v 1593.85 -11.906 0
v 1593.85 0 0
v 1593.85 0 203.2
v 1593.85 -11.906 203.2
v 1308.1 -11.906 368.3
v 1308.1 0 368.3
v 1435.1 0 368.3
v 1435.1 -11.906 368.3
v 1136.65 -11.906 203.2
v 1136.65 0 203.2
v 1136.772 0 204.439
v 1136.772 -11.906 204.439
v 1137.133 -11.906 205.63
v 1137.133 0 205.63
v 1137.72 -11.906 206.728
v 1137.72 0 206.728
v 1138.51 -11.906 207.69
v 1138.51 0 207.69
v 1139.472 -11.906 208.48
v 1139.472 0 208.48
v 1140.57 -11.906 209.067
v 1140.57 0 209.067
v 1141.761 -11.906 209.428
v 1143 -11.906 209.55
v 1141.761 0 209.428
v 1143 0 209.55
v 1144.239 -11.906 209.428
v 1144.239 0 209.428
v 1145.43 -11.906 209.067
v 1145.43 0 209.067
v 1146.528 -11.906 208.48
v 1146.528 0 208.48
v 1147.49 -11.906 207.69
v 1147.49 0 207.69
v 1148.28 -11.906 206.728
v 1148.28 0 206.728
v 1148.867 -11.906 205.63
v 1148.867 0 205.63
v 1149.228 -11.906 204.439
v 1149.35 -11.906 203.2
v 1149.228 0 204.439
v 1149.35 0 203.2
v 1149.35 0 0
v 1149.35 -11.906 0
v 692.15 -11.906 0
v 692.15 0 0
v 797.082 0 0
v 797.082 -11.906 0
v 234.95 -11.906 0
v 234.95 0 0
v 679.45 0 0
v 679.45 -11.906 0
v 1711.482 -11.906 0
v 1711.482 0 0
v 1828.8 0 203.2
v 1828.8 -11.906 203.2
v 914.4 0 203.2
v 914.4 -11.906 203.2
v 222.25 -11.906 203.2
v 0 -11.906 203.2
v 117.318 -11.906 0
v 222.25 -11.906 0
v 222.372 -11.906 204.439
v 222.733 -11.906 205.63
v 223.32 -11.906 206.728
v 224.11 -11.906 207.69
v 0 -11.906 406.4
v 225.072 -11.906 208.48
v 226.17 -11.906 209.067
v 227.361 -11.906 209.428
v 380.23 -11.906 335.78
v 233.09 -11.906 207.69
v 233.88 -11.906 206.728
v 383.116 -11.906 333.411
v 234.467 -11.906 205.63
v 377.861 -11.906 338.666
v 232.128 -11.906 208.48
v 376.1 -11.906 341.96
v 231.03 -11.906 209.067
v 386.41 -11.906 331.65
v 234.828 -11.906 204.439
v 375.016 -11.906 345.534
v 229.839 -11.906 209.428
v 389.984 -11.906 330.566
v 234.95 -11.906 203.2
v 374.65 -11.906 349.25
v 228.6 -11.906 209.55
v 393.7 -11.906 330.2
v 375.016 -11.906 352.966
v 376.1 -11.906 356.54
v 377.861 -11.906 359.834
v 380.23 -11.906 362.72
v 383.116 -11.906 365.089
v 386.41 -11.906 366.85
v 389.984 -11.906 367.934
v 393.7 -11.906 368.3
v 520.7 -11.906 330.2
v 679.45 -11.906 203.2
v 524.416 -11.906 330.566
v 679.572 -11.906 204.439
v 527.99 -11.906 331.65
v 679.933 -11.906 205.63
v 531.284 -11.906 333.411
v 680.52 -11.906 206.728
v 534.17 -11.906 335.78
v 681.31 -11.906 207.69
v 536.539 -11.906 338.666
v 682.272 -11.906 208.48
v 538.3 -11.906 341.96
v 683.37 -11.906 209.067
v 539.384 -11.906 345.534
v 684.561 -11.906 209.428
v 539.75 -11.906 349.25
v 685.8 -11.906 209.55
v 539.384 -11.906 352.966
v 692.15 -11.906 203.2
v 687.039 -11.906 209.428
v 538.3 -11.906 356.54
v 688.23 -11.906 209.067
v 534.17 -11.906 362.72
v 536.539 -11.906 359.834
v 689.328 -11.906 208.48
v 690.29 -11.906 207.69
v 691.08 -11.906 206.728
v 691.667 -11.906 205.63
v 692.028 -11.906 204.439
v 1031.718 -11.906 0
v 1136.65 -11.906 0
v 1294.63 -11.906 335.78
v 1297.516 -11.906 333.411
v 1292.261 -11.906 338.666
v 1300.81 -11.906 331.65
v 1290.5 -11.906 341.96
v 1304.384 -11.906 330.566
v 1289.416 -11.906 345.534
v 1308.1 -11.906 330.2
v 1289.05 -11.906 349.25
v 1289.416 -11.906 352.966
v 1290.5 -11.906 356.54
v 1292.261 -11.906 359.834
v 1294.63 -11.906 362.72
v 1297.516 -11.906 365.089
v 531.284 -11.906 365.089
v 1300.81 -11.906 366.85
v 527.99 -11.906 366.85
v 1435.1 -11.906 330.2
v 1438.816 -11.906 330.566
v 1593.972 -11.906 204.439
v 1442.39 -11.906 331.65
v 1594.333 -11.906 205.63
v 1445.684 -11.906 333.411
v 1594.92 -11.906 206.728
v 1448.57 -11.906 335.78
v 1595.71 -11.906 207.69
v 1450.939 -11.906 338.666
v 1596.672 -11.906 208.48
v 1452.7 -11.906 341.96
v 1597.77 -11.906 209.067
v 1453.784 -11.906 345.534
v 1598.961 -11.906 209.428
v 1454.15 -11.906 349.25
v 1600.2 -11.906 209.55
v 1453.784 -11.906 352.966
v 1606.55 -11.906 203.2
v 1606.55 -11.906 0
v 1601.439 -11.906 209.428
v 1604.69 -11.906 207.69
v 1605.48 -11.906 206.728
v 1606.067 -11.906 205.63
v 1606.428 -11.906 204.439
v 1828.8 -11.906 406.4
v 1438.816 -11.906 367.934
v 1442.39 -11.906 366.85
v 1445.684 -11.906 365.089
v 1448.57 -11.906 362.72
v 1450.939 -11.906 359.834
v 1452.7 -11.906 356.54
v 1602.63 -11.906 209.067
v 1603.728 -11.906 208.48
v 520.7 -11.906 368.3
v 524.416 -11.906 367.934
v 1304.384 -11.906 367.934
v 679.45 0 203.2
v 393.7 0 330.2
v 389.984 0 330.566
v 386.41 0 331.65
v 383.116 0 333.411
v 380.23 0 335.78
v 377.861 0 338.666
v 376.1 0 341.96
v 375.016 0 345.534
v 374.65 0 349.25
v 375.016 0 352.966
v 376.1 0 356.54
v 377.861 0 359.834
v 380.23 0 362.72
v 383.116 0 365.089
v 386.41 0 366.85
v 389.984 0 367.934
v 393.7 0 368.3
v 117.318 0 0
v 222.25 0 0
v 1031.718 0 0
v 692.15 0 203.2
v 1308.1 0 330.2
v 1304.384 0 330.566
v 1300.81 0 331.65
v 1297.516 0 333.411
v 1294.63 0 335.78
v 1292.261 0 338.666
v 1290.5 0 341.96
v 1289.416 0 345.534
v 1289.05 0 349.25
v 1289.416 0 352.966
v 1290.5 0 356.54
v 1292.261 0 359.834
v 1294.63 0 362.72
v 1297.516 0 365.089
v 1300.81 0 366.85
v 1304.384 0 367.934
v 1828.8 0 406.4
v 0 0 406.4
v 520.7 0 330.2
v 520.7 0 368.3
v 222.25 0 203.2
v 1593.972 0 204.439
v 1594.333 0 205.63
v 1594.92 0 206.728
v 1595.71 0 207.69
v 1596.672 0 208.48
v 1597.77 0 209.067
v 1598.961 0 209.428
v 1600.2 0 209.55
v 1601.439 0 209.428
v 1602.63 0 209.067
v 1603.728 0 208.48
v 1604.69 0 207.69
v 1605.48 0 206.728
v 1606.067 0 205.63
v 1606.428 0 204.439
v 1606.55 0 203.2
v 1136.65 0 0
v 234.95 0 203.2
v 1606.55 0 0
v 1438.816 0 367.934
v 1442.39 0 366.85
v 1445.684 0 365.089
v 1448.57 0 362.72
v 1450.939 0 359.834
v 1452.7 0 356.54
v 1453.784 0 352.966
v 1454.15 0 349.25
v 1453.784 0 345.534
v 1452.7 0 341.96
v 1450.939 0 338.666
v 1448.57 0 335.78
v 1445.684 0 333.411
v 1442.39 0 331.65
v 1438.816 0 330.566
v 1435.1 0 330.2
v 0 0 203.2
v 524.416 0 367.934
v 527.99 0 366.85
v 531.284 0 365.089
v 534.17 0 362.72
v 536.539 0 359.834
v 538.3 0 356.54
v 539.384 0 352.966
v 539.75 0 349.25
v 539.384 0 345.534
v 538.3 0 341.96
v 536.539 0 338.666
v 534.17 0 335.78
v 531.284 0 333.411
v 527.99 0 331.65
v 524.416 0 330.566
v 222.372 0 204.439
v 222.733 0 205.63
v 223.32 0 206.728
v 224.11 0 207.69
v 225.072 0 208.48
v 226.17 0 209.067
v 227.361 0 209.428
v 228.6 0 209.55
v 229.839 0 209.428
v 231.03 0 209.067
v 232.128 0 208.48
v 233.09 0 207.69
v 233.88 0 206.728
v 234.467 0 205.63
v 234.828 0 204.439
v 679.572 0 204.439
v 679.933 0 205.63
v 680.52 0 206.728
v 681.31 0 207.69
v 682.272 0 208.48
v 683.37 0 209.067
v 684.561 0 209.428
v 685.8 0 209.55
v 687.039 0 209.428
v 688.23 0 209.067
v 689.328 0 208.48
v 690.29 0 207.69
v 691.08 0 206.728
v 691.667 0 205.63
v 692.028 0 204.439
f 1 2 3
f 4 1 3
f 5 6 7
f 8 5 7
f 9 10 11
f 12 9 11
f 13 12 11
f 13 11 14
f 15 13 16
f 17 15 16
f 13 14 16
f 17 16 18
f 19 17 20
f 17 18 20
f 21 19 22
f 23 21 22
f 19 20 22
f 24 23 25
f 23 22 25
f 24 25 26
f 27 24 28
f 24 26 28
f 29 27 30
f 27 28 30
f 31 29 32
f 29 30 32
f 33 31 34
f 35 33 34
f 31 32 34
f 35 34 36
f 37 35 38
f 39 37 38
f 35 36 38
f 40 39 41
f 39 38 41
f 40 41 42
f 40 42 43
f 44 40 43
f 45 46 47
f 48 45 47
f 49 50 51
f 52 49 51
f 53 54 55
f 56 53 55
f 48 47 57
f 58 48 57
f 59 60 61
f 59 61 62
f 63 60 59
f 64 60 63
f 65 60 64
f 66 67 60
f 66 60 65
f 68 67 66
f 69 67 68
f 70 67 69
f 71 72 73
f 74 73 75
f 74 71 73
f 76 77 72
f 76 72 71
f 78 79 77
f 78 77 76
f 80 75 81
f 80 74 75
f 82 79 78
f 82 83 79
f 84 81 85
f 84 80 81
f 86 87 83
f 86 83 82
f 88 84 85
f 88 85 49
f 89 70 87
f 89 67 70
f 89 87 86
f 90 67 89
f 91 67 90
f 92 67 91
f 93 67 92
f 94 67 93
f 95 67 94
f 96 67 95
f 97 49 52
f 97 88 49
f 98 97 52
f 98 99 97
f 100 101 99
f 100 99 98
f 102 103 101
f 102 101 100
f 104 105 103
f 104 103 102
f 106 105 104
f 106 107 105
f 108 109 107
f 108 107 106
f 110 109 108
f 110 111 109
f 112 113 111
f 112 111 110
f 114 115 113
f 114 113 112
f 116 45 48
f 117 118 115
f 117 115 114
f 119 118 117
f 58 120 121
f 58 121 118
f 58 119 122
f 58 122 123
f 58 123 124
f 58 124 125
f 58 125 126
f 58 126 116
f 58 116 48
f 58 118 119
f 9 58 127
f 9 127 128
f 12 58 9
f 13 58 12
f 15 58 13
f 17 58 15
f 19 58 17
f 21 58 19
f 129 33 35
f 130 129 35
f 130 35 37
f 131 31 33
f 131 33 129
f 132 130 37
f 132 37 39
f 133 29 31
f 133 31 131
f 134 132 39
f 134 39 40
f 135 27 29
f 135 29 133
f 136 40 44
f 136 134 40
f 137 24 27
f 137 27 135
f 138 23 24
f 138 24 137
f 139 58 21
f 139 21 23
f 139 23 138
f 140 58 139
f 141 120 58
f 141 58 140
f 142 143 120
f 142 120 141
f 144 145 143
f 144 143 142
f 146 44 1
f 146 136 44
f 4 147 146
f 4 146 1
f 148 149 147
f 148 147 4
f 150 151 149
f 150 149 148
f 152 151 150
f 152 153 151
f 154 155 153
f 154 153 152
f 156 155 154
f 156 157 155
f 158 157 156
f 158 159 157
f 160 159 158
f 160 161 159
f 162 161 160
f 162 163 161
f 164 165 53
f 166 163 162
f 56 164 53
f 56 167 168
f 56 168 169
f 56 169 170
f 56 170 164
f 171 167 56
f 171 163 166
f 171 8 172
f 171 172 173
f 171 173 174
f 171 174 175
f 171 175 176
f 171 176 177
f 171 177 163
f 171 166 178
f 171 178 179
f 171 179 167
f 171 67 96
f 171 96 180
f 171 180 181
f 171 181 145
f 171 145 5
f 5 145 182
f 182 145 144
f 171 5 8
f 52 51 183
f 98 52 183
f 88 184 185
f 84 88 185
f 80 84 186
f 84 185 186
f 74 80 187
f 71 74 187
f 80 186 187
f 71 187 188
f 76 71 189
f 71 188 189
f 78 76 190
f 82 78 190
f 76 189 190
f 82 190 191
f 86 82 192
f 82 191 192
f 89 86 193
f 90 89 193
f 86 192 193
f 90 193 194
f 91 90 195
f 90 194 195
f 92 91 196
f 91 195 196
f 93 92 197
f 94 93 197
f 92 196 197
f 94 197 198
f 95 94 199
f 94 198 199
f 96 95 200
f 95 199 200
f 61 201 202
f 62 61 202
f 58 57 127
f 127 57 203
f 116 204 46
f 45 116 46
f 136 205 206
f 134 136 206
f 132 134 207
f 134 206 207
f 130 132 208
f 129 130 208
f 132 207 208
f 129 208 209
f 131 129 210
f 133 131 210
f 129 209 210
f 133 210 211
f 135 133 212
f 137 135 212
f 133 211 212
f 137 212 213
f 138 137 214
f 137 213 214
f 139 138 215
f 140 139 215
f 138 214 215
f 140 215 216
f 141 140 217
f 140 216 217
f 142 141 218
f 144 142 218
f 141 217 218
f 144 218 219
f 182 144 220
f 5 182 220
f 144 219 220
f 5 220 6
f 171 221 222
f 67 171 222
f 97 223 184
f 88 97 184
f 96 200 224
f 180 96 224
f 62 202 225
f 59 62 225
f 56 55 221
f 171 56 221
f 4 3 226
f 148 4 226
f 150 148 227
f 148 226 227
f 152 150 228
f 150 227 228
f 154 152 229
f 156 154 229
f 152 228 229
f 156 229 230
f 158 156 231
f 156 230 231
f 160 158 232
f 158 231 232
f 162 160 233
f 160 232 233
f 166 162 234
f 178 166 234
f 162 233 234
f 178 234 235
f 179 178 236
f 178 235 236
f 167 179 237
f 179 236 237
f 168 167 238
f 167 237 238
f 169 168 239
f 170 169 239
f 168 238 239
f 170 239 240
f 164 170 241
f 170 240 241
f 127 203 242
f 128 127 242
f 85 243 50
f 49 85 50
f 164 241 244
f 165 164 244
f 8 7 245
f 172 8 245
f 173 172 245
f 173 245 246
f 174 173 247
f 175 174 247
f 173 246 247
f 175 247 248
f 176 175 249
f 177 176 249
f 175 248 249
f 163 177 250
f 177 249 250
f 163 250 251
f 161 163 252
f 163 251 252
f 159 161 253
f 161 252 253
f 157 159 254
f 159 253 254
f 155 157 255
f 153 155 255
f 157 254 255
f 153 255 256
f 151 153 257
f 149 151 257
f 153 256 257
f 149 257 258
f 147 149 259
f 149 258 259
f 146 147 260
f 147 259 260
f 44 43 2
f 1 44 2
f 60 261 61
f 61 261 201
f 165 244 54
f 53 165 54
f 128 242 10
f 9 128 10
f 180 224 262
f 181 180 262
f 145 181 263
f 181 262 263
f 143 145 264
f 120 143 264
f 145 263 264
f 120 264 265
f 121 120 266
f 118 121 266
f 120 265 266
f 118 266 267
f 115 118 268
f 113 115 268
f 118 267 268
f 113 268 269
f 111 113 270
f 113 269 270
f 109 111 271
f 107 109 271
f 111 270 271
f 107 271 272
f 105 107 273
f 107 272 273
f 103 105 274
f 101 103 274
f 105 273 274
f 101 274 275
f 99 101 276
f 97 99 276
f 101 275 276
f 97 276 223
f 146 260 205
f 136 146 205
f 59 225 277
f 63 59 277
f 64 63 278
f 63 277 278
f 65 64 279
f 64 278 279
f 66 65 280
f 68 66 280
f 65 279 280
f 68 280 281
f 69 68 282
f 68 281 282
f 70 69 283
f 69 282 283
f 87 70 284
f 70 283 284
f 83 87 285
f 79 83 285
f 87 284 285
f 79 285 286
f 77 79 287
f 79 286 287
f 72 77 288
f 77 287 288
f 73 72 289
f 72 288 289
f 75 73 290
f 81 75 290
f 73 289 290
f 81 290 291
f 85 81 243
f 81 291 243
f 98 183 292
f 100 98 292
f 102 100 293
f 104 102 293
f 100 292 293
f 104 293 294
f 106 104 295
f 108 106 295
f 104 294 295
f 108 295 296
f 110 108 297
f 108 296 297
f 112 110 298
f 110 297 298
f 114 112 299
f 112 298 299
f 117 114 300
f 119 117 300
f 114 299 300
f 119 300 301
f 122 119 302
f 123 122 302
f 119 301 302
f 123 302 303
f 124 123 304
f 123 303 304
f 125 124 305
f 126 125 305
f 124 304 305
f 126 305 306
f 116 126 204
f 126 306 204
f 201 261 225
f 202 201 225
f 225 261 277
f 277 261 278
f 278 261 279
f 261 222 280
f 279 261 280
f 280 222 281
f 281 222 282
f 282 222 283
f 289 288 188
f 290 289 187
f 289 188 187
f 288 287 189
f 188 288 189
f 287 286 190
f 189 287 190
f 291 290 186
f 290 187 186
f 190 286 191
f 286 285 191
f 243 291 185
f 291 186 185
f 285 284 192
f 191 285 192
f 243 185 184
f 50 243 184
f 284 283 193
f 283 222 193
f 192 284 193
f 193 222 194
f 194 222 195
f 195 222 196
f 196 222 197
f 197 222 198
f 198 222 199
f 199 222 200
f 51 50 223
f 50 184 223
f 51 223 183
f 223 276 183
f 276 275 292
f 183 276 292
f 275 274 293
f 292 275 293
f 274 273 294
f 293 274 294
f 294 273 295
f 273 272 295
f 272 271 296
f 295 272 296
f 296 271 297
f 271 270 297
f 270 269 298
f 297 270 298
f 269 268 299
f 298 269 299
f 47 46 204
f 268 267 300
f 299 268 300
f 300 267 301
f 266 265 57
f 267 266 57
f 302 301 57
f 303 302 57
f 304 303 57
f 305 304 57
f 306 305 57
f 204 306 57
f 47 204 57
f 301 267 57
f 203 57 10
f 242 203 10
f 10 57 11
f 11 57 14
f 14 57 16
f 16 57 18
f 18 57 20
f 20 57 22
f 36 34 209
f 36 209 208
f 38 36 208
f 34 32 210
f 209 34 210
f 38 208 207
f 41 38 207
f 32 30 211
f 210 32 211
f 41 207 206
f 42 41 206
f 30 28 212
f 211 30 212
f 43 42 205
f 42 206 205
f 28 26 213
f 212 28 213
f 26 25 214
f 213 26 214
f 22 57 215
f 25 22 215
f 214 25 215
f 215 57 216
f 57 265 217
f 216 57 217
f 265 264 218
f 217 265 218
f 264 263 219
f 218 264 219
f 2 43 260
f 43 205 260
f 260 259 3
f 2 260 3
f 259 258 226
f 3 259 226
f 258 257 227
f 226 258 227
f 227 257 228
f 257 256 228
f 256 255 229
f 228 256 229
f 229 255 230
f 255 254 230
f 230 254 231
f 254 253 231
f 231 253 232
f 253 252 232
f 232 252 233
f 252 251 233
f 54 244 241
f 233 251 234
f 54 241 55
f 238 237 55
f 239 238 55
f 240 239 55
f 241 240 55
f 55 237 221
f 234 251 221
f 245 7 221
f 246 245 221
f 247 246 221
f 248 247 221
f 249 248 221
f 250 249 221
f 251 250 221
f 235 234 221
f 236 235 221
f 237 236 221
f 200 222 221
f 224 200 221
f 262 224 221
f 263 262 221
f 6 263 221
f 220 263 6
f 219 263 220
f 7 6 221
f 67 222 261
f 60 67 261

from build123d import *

# Parameters (mm, degrees)
F2_DEPTH = 11.90625


# Not quite as in the source:
# - a variable given as a bare number and used for a length is read in inches; the dataset says mm whatever the document's units were


with BuildPart() as f2:
    # F1 (on Front) → F2 (new body)
    with BuildSketch(Plane.XZ):
        with BuildLine():
            Line((914.4, 406.4), (0, 406.4))
            Line((0, 406.4), (0, 203.2))
            Line((0, 203.2), (117.3175746993, 0))
            Line((117.3175746993, 0), (222.25, 0))
            Line((222.25, 0), (222.25, 203.2))
            ThreePointArc((222.25, 203.2), (228.6, 209.55), (234.95, 203.2))
            Line((234.95, 203.2), (234.95, 0))
            Line((234.95, 0), (679.45, 0))
            Line((679.45, 0), (679.45, 203.2))
            ThreePointArc((679.45, 203.2), (685.8, 209.55), (692.15, 203.2))
            Line((692.15, 203.2), (692.15, 0))
            Line((692.15, 0), (797.0824253007, 0))
            Line((797.0824253007, 0), (914.4, 203.2))
            Line((914.4, 203.2), (1031.7175746993, 0))
            Line((1031.7175746993, 0), (1136.65, 0))
            Line((1136.65, 0), (1136.65, 203.2))
            ThreePointArc((1136.65, 203.2), (1143, 209.55), (1149.35, 203.2))
            Line((1149.35, 203.2), (1149.35, 0))
            Line((1149.35, 0), (1593.85, 0))
            Line((1593.85, 0), (1593.85, 203.2))
            ThreePointArc((1593.85, 203.2), (1600.2, 209.55), (1606.55, 203.2))
            Line((1606.55, 203.2), (1606.55, 0))
            Line((1606.55, 0), (1711.4824253007, 0))
            Line((1711.4824253007, 0), (1828.8, 203.2))
            Line((1828.8, 203.2), (1828.8, 406.4))
            Line((1828.8, 406.4), (914.4, 406.4))
        make_face()
        with BuildLine():
            Line((393.7, 368.3), (457.2, 368.3))
            Line((457.2, 368.3), (520.7, 368.3))
            ThreePointArc((520.7, 368.3), (539.75, 349.25), (520.7, 330.2))
            Line((520.7, 330.2), (457.2, 330.2))
            Line((457.2, 330.2), (393.7, 330.2))
            ThreePointArc((393.7, 330.2), (374.65, 349.25), (393.7, 368.3))
        make_face(mode=Mode.SUBTRACT)
        with BuildLine():
            Line((1308.1, 368.3), (1371.6, 368.3))
            Line((1371.6, 368.3), (1435.1, 368.3))
            ThreePointArc((1435.1, 368.3), (1454.15, 349.25), (1435.1, 330.2))
            Line((1435.1, 330.2), (1371.6, 330.2))
            Line((1371.6, 330.2), (1308.1, 330.2))
            ThreePointArc((1308.1, 330.2), (1289.05, 349.25), (1308.1, 368.3))
        make_face(mode=Mode.SUBTRACT)
    extrude(amount=F2_DEPTH)


solid = f2.part
